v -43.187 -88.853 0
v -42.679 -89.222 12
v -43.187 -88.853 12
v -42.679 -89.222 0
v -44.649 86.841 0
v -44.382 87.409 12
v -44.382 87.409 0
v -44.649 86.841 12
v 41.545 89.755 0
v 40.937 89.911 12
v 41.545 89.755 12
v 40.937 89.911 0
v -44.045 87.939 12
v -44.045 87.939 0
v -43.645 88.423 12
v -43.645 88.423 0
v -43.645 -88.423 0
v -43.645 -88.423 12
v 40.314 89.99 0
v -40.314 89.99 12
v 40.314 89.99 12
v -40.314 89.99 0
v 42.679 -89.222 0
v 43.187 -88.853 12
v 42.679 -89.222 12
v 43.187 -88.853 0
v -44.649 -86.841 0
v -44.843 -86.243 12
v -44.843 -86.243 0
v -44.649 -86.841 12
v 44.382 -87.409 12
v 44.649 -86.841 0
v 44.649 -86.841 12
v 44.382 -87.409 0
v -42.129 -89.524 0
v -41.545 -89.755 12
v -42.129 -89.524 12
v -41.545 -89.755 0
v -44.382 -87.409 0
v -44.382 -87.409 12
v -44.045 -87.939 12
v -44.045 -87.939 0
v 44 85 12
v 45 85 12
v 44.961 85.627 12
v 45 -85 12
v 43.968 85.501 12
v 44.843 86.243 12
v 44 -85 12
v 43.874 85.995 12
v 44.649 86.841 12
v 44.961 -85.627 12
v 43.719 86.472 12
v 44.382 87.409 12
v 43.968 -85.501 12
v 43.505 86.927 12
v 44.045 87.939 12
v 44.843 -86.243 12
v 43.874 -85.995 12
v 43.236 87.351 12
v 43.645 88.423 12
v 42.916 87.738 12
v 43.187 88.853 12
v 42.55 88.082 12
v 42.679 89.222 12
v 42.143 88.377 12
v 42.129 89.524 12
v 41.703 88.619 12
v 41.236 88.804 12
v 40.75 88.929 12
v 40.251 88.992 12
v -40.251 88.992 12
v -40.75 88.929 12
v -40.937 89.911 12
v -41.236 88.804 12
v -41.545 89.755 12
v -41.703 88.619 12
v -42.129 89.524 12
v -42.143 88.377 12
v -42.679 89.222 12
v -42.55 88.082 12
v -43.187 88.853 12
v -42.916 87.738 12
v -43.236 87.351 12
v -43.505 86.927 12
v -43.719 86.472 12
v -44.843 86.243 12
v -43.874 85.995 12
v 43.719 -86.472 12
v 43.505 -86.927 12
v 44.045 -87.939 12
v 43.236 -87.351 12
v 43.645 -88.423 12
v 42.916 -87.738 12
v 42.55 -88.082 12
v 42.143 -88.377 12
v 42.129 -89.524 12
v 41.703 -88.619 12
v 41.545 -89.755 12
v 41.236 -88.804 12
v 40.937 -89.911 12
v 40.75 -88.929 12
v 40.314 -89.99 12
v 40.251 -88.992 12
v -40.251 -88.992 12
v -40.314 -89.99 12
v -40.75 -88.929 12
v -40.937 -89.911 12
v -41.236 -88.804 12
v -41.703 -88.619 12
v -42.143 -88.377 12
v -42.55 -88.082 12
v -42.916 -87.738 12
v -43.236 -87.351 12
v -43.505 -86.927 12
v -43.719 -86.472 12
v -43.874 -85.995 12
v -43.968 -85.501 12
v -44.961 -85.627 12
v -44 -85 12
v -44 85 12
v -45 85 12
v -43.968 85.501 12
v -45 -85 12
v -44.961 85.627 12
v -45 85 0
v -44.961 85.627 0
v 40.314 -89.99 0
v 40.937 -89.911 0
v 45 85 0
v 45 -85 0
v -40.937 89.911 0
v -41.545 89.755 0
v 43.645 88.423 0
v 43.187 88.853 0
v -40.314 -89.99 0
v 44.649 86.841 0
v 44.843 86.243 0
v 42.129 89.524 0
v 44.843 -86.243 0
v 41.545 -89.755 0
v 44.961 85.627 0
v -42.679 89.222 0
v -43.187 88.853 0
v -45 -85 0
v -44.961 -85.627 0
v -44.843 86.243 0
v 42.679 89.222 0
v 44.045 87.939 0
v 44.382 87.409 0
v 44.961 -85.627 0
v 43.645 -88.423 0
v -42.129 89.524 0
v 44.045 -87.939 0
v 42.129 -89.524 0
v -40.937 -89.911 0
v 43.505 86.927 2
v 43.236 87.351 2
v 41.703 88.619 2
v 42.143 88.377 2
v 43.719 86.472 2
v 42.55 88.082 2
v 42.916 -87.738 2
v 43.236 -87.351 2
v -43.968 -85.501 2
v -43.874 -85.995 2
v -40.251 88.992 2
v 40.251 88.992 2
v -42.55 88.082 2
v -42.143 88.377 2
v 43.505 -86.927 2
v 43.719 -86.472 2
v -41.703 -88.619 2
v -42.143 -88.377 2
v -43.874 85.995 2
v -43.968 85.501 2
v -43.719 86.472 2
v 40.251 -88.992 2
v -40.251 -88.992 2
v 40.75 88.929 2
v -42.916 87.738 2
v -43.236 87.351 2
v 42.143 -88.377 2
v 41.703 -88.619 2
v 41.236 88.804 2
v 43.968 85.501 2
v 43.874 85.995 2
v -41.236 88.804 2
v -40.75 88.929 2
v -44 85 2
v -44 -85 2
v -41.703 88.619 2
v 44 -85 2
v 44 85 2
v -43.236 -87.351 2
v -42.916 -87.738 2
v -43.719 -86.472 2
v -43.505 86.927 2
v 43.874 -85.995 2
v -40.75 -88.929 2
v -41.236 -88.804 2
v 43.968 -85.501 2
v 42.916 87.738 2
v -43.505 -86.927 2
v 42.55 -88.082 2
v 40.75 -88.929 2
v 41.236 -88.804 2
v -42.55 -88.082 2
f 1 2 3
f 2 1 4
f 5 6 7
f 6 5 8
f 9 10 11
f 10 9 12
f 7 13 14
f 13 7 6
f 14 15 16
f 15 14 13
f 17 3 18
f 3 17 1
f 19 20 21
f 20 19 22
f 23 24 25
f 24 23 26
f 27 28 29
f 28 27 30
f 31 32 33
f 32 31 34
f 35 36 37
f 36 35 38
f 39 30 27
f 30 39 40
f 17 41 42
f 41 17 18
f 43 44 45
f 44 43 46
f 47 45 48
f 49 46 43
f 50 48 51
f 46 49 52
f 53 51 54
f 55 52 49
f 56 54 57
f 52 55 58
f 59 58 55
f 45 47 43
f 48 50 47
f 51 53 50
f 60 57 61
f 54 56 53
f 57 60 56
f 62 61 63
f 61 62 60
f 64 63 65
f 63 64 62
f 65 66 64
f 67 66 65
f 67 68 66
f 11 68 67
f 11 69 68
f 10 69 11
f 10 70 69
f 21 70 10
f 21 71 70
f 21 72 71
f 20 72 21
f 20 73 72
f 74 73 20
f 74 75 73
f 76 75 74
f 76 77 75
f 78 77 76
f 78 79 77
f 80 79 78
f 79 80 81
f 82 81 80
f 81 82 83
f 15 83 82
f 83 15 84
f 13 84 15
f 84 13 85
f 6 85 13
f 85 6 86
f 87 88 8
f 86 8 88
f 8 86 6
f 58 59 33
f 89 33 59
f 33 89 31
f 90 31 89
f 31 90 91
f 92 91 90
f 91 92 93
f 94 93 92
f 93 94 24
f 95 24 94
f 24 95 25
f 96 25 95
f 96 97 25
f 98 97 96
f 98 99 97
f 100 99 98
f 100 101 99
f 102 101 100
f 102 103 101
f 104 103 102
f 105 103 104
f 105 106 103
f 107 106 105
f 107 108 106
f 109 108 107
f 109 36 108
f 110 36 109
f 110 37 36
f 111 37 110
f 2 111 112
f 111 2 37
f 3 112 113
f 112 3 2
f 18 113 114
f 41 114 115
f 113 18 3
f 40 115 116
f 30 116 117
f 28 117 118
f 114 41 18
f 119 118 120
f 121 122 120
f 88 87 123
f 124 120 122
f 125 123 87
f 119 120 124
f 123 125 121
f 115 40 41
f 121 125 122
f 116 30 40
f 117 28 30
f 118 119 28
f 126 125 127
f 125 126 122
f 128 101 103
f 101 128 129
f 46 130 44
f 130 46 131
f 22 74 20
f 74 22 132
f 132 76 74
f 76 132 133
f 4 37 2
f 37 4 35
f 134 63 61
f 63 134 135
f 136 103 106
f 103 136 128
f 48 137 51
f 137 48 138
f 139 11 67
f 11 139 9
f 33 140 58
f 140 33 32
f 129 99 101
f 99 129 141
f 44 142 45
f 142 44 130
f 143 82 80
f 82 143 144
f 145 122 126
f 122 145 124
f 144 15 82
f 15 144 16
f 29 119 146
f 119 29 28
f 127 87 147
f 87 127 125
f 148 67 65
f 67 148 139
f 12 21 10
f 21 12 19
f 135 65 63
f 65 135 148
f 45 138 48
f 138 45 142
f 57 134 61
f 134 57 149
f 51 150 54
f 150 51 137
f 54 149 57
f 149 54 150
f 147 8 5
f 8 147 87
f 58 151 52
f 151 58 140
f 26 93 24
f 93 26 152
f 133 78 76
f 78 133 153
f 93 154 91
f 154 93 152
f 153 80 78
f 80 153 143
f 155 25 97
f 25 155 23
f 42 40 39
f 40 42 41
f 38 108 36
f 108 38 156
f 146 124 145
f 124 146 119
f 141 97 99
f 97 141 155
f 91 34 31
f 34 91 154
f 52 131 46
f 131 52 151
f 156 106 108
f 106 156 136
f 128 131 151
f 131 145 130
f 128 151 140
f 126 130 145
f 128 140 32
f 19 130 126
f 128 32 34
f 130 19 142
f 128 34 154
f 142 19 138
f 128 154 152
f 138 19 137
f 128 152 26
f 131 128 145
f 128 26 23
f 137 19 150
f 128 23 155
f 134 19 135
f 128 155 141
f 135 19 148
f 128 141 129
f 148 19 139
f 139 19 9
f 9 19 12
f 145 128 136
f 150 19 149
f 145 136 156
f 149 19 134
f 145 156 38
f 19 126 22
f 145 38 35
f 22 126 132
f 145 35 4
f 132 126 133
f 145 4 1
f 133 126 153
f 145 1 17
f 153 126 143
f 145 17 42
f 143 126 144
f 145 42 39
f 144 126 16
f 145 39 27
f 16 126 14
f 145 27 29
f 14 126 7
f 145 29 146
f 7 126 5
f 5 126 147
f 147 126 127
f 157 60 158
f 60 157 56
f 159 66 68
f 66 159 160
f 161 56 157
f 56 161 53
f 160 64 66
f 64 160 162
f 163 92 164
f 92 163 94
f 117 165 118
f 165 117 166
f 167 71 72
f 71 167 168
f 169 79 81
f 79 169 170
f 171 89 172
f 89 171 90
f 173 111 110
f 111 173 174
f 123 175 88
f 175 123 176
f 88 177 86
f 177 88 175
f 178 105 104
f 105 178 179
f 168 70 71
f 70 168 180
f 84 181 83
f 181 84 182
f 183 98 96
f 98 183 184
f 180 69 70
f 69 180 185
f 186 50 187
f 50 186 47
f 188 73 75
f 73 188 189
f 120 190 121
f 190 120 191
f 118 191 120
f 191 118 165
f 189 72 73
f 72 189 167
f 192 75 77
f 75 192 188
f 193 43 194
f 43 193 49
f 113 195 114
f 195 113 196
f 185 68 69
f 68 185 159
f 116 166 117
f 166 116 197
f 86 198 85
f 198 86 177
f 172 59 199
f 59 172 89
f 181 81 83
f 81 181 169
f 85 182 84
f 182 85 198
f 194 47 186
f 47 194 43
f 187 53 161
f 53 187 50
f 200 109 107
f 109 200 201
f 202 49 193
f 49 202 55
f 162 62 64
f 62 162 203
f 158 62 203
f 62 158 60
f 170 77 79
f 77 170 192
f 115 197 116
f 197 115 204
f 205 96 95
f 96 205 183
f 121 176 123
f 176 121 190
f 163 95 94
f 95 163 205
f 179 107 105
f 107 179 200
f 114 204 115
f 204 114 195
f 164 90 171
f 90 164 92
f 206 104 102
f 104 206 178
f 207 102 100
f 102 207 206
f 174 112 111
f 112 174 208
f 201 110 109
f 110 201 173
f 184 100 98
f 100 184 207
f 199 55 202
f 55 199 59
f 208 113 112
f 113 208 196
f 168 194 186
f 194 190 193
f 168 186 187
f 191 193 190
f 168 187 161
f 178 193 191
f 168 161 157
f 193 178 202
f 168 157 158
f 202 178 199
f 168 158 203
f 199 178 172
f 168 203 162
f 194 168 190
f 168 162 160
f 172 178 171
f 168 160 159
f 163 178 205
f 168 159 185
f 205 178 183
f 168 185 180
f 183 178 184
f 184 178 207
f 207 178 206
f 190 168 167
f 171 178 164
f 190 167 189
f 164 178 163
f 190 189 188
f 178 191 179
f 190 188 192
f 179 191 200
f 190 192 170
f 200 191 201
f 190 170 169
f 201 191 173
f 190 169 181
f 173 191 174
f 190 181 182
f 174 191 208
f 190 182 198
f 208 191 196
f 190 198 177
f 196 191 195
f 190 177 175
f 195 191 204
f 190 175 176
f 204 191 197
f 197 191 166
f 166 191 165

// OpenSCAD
$fn = 50;


difference() {
	union() {
		hull() {
			translate(v = [-40.0000000000, 85.0000000000, 0]) {
				cylinder(h = 12, r = 5);
			}
			translate(v = [40.0000000000, 85.0000000000, 0]) {
				cylinder(h = 12, r = 5);
			}
			translate(v = [-40.0000000000, -85.0000000000, 0]) {
				cylinder(h = 12, r = 5);
			}
			translate(v = [40.0000000000, -85.0000000000, 0]) {
				cylinder(h = 12, r = 5);
			}
		}
	}
	union() {
		translate(v = [0, 0, 2]) {
			hull() {
				translate(v = [-40.0000000000, 85.0000000000, 0]) {
					cylinder(h = 10, r = 4);
				}
				translate(v = [40.0000000000, 85.0000000000, 0]) {
					cylinder(h = 10, r = 4);
				}
				translate(v = [-40.0000000000, -85.0000000000, 0]) {
					cylinder(h = 10, r = 4);
				}
				translate(v = [40.0000000000, -85.0000000000, 0]) {
					cylinder(h = 10, r = 4);
				}
			}
		}
	}
}
